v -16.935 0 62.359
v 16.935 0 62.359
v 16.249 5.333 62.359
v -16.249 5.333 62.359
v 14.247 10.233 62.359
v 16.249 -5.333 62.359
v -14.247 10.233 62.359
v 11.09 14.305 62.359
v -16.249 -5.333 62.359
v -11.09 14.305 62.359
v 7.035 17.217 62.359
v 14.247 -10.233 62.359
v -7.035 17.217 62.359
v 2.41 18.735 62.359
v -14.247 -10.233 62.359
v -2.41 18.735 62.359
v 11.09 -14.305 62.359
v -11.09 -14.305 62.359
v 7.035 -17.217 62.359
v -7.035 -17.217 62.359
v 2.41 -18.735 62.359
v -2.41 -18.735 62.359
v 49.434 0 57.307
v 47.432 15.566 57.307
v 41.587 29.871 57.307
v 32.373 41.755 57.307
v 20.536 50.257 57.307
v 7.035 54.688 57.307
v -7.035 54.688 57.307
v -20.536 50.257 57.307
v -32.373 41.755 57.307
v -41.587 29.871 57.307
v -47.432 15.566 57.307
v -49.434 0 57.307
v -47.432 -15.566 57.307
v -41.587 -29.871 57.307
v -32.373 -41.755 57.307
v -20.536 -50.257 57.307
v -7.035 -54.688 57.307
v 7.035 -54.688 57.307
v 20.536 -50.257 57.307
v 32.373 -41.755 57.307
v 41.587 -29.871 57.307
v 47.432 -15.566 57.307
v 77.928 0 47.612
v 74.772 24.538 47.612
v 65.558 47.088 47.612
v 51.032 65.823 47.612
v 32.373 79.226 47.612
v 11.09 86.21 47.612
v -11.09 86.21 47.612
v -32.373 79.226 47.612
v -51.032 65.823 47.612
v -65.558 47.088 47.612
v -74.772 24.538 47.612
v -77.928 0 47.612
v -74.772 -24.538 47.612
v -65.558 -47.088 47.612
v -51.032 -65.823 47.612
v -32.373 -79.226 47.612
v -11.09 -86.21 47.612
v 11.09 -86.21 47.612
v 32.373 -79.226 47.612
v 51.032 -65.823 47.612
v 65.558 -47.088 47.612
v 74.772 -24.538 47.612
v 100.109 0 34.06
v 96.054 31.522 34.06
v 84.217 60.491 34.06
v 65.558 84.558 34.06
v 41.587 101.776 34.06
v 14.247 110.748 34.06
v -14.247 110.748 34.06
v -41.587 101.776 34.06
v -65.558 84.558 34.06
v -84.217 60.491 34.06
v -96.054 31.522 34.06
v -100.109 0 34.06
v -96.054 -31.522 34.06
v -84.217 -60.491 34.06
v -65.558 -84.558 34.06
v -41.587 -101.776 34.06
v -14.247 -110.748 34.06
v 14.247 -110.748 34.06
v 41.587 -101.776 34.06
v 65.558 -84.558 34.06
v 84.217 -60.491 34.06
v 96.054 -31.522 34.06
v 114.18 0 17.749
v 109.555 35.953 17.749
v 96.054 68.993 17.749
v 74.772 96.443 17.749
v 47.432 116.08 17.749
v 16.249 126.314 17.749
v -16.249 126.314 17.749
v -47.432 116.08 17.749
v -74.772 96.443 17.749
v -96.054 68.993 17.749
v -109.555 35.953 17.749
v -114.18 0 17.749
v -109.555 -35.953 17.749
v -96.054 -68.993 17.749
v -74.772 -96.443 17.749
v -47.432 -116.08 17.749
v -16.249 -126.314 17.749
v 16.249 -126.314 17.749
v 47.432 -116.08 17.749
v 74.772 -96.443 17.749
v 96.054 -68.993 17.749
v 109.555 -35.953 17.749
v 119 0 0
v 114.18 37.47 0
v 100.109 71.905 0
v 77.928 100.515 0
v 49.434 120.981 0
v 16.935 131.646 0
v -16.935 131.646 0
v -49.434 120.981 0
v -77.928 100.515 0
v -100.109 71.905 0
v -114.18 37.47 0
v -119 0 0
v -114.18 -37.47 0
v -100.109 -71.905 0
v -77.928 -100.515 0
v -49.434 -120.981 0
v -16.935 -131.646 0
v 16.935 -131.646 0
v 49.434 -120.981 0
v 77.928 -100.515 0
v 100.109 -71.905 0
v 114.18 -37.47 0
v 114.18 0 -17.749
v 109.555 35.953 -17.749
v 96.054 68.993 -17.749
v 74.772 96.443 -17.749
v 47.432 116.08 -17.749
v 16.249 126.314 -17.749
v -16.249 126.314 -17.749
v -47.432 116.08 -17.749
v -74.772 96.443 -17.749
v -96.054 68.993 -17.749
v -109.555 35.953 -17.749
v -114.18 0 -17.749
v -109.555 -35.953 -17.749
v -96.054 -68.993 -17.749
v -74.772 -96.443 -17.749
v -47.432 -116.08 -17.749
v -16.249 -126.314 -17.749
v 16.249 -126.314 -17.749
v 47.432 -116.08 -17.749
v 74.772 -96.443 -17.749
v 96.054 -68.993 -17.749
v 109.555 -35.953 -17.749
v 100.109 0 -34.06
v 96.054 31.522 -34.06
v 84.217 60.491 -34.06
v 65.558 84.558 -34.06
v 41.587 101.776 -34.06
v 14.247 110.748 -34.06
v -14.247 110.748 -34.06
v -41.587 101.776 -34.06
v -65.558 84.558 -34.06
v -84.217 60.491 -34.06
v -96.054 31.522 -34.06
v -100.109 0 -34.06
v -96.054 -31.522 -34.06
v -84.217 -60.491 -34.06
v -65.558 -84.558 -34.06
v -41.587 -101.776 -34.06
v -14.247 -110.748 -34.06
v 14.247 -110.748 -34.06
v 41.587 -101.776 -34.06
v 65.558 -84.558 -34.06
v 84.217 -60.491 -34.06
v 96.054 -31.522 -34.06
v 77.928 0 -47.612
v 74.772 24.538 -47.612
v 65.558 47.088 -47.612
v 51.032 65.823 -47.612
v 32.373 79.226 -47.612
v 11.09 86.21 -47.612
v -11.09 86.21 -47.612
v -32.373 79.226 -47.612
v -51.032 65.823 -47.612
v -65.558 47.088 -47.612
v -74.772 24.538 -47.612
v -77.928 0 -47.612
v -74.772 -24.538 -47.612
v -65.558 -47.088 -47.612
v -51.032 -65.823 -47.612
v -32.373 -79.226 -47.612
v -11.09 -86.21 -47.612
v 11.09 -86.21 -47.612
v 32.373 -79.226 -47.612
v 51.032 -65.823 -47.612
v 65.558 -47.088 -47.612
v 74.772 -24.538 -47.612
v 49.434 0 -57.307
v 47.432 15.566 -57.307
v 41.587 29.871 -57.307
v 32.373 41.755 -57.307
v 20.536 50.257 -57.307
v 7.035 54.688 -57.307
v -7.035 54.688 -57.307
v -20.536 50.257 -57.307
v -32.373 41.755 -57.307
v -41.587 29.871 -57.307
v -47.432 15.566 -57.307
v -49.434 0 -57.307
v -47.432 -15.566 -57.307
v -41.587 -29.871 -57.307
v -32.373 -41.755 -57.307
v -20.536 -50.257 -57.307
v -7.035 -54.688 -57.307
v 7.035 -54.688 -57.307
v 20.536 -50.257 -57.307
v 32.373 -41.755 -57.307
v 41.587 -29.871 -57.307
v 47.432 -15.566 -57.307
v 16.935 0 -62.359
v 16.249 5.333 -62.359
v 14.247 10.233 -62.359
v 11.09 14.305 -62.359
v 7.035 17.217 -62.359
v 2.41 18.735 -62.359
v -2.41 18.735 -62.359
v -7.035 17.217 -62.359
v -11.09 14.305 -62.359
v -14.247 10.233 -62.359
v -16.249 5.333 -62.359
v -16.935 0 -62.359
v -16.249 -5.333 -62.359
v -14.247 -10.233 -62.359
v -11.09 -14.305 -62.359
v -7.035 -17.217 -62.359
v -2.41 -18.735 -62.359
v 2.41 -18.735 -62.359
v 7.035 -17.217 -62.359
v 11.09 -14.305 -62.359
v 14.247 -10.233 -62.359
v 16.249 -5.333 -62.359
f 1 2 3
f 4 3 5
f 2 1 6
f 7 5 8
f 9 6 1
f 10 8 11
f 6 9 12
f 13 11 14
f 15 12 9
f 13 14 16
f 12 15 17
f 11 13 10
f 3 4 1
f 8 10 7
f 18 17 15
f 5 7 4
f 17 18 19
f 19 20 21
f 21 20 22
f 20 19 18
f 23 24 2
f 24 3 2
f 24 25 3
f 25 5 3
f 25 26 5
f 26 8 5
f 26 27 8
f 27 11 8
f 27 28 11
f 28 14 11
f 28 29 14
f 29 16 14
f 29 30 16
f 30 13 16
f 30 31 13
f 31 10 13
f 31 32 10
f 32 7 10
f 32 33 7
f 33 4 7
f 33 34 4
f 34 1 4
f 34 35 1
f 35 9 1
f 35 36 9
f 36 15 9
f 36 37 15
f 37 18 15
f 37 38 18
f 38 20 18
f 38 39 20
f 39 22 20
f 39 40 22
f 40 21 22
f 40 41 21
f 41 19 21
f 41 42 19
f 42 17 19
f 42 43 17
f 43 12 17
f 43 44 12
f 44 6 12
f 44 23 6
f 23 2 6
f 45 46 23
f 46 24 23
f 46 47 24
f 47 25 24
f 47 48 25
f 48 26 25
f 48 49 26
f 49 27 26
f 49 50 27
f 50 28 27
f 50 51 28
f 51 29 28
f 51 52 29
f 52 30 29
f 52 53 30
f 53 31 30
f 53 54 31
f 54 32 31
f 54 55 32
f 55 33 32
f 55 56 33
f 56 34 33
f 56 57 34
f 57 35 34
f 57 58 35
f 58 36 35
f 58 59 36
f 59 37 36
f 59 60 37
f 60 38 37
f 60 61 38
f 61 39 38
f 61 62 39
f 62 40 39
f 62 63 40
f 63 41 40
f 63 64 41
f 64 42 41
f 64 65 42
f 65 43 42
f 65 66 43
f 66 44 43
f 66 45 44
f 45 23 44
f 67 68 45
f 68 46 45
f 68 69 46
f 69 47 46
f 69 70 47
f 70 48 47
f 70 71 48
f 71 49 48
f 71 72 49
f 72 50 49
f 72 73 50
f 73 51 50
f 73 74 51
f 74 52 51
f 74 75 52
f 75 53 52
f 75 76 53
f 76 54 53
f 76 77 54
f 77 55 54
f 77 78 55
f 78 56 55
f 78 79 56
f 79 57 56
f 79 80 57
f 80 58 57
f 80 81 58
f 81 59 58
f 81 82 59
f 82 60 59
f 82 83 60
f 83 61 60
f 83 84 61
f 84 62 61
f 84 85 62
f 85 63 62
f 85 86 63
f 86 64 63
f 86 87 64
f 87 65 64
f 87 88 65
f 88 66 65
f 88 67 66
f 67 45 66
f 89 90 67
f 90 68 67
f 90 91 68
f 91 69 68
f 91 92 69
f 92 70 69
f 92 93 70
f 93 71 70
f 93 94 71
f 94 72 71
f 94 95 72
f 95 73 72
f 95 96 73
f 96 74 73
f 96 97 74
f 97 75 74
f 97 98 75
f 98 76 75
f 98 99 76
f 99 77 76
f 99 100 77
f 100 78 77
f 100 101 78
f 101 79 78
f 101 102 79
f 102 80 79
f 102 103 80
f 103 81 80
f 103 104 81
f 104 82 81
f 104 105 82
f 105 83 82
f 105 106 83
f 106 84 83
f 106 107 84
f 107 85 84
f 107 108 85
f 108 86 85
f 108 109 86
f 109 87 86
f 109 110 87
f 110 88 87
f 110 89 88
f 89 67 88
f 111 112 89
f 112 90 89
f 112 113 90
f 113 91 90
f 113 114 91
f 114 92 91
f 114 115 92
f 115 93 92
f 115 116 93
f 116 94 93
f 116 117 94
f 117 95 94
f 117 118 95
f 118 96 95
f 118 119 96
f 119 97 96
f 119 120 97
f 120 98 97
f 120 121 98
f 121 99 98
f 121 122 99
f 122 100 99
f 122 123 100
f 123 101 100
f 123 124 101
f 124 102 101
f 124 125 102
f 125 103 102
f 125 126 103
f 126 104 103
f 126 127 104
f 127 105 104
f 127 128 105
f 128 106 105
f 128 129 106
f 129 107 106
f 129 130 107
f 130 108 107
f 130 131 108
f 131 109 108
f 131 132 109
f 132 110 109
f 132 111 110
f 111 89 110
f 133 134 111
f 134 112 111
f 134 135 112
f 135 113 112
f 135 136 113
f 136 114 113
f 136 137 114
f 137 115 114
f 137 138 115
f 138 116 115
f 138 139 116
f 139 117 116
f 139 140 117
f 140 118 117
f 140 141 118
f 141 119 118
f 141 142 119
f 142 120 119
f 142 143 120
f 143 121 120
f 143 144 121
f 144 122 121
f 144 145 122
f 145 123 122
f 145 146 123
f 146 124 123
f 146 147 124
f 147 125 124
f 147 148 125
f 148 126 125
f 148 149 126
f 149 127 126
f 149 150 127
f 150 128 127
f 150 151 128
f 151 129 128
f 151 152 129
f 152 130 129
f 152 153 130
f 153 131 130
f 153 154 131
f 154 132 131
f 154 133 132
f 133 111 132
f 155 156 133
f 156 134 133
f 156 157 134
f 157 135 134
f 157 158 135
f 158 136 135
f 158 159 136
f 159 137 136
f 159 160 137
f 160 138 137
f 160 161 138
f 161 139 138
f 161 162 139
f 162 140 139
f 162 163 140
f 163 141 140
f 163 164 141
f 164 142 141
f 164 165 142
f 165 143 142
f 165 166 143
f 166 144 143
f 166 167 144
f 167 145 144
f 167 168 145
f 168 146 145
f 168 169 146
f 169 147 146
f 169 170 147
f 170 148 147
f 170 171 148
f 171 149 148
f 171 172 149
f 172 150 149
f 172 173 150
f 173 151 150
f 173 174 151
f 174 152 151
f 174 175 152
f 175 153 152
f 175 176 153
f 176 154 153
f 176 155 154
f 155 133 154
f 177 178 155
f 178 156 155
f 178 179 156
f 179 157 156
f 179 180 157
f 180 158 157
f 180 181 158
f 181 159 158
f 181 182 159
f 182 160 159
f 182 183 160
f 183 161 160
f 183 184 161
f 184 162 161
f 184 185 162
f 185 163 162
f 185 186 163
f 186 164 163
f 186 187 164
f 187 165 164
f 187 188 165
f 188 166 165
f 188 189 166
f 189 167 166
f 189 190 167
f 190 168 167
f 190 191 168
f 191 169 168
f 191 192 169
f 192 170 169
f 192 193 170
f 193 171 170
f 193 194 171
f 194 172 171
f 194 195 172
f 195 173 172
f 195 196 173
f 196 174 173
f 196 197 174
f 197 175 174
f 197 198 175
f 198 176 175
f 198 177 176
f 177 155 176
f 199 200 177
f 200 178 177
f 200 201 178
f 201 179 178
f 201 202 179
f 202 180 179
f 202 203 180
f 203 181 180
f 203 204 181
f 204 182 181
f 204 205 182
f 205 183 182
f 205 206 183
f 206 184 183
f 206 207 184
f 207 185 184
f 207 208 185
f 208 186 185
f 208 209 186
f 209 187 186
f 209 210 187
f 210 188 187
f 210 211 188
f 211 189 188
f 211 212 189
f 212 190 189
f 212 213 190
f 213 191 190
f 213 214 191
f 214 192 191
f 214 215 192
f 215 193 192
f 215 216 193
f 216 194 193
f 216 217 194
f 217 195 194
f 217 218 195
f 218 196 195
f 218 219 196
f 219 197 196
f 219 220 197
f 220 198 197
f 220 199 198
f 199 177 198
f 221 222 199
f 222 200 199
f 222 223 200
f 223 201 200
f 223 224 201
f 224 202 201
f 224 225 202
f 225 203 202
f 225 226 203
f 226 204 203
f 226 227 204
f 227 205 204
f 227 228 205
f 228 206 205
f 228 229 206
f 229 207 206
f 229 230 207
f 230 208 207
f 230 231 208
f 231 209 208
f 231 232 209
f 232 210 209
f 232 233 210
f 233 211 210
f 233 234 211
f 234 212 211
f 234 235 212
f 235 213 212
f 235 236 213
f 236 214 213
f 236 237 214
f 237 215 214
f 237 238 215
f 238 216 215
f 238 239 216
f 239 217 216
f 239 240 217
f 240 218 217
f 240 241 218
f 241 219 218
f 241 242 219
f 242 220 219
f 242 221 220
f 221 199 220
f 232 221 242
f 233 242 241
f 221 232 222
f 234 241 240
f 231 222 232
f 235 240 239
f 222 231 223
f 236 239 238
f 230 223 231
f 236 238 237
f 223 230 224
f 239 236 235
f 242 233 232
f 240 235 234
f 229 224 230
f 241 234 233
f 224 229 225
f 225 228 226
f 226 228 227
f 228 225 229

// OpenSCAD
// Generated by SolidPython 1.0.1 on 2020-07-29 00:46:53


scale(v = [17, 19, 9]) {
	sphere(r = 7);
}
/***********************************************
*********      SolidPython code:      **********
************************************************
 
# import packages: SolidPython
from solid import *
from solid.utils import *
from itertools import chain, combinations, permutations


class Resize:

    def __init__(self, scad_file):
        self.scad_file = scad_file
        #self.scad_file = import_scad(scad_file)
        # cone/cylinder param:
        self.r1 = 0
        self.r2 = 0
        self.h = 0
        # rectangular prism param:
        self.w = 0
        self.l = 0
        # ellipse param:
        self.r = 0

    # import OpenScad code (file name corresponds to shape)


    # classify shape + parameters
    def assign(self, param1, param2, param3):
        if self.scad_file == 'cone.scad':
            self.r1 = param1
            self.r2 = param2
            self.h = param3
        elif self.scad_file == 'cylinder.scad':
            self.r1 = param1
            self.r2 = param2
            self.h = param3
        elif self.scad_file == 'rectangularPrism.scad':
            self.h = param1
            self.l = param2
            self.w = param3
        else:
            self.r = param1
            self.h = param2

    # resize parameters
    def iterate(self):
        x = range(3, 20, 2)
        i = 1
        if self.scad_file == 'cone.scad':
            tempList = list(permutations(x, 2))
            for temp in tempList:
                param1 = temp[0]
                param2 = temp[1]
                filepath = 'produced_scad_files/' + 'cone' + str(param1) + '_' + str(param2) + '_' + '.scad'
                scad_render_to_file(cylinder(h=param1, r1=param2, r2=0), filepath)

        elif self.scad_file == 'cylinder.scad':
            tempList = list(permutations(x, 3))
            for temp in tempList:
                param1 = temp[0]
                param2 = temp[1]
                filepath = 'produced_scad_files/' + 'cylinder' + str(param1) + '_' + str(param2) + '_' + '.scad'
                scad_render_to_file(cylinder(h=param1, r1=param2, r2=param2), filepath)

        elif self.scad_file == 'rectangularPrism.scad':
            tempList = list(permutations(x, 3))
            for temp in tempList:
                param1 = temp[0]
                param2 = temp[1]
                param3 = temp[2]
                filepath = 'produced_scad_files/' + 'rectangularPrism' + str(param1) + '_' + str(param2) + '_' + str(
                    param3) + '.scad'
                scad_render_to_file(cube(size=(param1, param2, param3)), filepath)

        elif self.scad_file == 'ellipse.scad':
            tempList = list(permutations(x, 4))
            for temp in tempList:
                param1 = temp[0]
                param2 = temp[1]
                param3 = temp[2]
                param4 = temp[3]
                filepath = 'produced_scad_files/' + 'ellipse' + str(param1) + '_' + str(param2) + '_' + str(param3) + '_' + str(param4) + '.scad'
                scad_render_to_file(scale([param1, param2, param3])(sphere(r=param4)), filepath)

    def render_to_scadfile(self):
        scad_render_to_file(scad, 'example.scad') 
 
************************************************/
